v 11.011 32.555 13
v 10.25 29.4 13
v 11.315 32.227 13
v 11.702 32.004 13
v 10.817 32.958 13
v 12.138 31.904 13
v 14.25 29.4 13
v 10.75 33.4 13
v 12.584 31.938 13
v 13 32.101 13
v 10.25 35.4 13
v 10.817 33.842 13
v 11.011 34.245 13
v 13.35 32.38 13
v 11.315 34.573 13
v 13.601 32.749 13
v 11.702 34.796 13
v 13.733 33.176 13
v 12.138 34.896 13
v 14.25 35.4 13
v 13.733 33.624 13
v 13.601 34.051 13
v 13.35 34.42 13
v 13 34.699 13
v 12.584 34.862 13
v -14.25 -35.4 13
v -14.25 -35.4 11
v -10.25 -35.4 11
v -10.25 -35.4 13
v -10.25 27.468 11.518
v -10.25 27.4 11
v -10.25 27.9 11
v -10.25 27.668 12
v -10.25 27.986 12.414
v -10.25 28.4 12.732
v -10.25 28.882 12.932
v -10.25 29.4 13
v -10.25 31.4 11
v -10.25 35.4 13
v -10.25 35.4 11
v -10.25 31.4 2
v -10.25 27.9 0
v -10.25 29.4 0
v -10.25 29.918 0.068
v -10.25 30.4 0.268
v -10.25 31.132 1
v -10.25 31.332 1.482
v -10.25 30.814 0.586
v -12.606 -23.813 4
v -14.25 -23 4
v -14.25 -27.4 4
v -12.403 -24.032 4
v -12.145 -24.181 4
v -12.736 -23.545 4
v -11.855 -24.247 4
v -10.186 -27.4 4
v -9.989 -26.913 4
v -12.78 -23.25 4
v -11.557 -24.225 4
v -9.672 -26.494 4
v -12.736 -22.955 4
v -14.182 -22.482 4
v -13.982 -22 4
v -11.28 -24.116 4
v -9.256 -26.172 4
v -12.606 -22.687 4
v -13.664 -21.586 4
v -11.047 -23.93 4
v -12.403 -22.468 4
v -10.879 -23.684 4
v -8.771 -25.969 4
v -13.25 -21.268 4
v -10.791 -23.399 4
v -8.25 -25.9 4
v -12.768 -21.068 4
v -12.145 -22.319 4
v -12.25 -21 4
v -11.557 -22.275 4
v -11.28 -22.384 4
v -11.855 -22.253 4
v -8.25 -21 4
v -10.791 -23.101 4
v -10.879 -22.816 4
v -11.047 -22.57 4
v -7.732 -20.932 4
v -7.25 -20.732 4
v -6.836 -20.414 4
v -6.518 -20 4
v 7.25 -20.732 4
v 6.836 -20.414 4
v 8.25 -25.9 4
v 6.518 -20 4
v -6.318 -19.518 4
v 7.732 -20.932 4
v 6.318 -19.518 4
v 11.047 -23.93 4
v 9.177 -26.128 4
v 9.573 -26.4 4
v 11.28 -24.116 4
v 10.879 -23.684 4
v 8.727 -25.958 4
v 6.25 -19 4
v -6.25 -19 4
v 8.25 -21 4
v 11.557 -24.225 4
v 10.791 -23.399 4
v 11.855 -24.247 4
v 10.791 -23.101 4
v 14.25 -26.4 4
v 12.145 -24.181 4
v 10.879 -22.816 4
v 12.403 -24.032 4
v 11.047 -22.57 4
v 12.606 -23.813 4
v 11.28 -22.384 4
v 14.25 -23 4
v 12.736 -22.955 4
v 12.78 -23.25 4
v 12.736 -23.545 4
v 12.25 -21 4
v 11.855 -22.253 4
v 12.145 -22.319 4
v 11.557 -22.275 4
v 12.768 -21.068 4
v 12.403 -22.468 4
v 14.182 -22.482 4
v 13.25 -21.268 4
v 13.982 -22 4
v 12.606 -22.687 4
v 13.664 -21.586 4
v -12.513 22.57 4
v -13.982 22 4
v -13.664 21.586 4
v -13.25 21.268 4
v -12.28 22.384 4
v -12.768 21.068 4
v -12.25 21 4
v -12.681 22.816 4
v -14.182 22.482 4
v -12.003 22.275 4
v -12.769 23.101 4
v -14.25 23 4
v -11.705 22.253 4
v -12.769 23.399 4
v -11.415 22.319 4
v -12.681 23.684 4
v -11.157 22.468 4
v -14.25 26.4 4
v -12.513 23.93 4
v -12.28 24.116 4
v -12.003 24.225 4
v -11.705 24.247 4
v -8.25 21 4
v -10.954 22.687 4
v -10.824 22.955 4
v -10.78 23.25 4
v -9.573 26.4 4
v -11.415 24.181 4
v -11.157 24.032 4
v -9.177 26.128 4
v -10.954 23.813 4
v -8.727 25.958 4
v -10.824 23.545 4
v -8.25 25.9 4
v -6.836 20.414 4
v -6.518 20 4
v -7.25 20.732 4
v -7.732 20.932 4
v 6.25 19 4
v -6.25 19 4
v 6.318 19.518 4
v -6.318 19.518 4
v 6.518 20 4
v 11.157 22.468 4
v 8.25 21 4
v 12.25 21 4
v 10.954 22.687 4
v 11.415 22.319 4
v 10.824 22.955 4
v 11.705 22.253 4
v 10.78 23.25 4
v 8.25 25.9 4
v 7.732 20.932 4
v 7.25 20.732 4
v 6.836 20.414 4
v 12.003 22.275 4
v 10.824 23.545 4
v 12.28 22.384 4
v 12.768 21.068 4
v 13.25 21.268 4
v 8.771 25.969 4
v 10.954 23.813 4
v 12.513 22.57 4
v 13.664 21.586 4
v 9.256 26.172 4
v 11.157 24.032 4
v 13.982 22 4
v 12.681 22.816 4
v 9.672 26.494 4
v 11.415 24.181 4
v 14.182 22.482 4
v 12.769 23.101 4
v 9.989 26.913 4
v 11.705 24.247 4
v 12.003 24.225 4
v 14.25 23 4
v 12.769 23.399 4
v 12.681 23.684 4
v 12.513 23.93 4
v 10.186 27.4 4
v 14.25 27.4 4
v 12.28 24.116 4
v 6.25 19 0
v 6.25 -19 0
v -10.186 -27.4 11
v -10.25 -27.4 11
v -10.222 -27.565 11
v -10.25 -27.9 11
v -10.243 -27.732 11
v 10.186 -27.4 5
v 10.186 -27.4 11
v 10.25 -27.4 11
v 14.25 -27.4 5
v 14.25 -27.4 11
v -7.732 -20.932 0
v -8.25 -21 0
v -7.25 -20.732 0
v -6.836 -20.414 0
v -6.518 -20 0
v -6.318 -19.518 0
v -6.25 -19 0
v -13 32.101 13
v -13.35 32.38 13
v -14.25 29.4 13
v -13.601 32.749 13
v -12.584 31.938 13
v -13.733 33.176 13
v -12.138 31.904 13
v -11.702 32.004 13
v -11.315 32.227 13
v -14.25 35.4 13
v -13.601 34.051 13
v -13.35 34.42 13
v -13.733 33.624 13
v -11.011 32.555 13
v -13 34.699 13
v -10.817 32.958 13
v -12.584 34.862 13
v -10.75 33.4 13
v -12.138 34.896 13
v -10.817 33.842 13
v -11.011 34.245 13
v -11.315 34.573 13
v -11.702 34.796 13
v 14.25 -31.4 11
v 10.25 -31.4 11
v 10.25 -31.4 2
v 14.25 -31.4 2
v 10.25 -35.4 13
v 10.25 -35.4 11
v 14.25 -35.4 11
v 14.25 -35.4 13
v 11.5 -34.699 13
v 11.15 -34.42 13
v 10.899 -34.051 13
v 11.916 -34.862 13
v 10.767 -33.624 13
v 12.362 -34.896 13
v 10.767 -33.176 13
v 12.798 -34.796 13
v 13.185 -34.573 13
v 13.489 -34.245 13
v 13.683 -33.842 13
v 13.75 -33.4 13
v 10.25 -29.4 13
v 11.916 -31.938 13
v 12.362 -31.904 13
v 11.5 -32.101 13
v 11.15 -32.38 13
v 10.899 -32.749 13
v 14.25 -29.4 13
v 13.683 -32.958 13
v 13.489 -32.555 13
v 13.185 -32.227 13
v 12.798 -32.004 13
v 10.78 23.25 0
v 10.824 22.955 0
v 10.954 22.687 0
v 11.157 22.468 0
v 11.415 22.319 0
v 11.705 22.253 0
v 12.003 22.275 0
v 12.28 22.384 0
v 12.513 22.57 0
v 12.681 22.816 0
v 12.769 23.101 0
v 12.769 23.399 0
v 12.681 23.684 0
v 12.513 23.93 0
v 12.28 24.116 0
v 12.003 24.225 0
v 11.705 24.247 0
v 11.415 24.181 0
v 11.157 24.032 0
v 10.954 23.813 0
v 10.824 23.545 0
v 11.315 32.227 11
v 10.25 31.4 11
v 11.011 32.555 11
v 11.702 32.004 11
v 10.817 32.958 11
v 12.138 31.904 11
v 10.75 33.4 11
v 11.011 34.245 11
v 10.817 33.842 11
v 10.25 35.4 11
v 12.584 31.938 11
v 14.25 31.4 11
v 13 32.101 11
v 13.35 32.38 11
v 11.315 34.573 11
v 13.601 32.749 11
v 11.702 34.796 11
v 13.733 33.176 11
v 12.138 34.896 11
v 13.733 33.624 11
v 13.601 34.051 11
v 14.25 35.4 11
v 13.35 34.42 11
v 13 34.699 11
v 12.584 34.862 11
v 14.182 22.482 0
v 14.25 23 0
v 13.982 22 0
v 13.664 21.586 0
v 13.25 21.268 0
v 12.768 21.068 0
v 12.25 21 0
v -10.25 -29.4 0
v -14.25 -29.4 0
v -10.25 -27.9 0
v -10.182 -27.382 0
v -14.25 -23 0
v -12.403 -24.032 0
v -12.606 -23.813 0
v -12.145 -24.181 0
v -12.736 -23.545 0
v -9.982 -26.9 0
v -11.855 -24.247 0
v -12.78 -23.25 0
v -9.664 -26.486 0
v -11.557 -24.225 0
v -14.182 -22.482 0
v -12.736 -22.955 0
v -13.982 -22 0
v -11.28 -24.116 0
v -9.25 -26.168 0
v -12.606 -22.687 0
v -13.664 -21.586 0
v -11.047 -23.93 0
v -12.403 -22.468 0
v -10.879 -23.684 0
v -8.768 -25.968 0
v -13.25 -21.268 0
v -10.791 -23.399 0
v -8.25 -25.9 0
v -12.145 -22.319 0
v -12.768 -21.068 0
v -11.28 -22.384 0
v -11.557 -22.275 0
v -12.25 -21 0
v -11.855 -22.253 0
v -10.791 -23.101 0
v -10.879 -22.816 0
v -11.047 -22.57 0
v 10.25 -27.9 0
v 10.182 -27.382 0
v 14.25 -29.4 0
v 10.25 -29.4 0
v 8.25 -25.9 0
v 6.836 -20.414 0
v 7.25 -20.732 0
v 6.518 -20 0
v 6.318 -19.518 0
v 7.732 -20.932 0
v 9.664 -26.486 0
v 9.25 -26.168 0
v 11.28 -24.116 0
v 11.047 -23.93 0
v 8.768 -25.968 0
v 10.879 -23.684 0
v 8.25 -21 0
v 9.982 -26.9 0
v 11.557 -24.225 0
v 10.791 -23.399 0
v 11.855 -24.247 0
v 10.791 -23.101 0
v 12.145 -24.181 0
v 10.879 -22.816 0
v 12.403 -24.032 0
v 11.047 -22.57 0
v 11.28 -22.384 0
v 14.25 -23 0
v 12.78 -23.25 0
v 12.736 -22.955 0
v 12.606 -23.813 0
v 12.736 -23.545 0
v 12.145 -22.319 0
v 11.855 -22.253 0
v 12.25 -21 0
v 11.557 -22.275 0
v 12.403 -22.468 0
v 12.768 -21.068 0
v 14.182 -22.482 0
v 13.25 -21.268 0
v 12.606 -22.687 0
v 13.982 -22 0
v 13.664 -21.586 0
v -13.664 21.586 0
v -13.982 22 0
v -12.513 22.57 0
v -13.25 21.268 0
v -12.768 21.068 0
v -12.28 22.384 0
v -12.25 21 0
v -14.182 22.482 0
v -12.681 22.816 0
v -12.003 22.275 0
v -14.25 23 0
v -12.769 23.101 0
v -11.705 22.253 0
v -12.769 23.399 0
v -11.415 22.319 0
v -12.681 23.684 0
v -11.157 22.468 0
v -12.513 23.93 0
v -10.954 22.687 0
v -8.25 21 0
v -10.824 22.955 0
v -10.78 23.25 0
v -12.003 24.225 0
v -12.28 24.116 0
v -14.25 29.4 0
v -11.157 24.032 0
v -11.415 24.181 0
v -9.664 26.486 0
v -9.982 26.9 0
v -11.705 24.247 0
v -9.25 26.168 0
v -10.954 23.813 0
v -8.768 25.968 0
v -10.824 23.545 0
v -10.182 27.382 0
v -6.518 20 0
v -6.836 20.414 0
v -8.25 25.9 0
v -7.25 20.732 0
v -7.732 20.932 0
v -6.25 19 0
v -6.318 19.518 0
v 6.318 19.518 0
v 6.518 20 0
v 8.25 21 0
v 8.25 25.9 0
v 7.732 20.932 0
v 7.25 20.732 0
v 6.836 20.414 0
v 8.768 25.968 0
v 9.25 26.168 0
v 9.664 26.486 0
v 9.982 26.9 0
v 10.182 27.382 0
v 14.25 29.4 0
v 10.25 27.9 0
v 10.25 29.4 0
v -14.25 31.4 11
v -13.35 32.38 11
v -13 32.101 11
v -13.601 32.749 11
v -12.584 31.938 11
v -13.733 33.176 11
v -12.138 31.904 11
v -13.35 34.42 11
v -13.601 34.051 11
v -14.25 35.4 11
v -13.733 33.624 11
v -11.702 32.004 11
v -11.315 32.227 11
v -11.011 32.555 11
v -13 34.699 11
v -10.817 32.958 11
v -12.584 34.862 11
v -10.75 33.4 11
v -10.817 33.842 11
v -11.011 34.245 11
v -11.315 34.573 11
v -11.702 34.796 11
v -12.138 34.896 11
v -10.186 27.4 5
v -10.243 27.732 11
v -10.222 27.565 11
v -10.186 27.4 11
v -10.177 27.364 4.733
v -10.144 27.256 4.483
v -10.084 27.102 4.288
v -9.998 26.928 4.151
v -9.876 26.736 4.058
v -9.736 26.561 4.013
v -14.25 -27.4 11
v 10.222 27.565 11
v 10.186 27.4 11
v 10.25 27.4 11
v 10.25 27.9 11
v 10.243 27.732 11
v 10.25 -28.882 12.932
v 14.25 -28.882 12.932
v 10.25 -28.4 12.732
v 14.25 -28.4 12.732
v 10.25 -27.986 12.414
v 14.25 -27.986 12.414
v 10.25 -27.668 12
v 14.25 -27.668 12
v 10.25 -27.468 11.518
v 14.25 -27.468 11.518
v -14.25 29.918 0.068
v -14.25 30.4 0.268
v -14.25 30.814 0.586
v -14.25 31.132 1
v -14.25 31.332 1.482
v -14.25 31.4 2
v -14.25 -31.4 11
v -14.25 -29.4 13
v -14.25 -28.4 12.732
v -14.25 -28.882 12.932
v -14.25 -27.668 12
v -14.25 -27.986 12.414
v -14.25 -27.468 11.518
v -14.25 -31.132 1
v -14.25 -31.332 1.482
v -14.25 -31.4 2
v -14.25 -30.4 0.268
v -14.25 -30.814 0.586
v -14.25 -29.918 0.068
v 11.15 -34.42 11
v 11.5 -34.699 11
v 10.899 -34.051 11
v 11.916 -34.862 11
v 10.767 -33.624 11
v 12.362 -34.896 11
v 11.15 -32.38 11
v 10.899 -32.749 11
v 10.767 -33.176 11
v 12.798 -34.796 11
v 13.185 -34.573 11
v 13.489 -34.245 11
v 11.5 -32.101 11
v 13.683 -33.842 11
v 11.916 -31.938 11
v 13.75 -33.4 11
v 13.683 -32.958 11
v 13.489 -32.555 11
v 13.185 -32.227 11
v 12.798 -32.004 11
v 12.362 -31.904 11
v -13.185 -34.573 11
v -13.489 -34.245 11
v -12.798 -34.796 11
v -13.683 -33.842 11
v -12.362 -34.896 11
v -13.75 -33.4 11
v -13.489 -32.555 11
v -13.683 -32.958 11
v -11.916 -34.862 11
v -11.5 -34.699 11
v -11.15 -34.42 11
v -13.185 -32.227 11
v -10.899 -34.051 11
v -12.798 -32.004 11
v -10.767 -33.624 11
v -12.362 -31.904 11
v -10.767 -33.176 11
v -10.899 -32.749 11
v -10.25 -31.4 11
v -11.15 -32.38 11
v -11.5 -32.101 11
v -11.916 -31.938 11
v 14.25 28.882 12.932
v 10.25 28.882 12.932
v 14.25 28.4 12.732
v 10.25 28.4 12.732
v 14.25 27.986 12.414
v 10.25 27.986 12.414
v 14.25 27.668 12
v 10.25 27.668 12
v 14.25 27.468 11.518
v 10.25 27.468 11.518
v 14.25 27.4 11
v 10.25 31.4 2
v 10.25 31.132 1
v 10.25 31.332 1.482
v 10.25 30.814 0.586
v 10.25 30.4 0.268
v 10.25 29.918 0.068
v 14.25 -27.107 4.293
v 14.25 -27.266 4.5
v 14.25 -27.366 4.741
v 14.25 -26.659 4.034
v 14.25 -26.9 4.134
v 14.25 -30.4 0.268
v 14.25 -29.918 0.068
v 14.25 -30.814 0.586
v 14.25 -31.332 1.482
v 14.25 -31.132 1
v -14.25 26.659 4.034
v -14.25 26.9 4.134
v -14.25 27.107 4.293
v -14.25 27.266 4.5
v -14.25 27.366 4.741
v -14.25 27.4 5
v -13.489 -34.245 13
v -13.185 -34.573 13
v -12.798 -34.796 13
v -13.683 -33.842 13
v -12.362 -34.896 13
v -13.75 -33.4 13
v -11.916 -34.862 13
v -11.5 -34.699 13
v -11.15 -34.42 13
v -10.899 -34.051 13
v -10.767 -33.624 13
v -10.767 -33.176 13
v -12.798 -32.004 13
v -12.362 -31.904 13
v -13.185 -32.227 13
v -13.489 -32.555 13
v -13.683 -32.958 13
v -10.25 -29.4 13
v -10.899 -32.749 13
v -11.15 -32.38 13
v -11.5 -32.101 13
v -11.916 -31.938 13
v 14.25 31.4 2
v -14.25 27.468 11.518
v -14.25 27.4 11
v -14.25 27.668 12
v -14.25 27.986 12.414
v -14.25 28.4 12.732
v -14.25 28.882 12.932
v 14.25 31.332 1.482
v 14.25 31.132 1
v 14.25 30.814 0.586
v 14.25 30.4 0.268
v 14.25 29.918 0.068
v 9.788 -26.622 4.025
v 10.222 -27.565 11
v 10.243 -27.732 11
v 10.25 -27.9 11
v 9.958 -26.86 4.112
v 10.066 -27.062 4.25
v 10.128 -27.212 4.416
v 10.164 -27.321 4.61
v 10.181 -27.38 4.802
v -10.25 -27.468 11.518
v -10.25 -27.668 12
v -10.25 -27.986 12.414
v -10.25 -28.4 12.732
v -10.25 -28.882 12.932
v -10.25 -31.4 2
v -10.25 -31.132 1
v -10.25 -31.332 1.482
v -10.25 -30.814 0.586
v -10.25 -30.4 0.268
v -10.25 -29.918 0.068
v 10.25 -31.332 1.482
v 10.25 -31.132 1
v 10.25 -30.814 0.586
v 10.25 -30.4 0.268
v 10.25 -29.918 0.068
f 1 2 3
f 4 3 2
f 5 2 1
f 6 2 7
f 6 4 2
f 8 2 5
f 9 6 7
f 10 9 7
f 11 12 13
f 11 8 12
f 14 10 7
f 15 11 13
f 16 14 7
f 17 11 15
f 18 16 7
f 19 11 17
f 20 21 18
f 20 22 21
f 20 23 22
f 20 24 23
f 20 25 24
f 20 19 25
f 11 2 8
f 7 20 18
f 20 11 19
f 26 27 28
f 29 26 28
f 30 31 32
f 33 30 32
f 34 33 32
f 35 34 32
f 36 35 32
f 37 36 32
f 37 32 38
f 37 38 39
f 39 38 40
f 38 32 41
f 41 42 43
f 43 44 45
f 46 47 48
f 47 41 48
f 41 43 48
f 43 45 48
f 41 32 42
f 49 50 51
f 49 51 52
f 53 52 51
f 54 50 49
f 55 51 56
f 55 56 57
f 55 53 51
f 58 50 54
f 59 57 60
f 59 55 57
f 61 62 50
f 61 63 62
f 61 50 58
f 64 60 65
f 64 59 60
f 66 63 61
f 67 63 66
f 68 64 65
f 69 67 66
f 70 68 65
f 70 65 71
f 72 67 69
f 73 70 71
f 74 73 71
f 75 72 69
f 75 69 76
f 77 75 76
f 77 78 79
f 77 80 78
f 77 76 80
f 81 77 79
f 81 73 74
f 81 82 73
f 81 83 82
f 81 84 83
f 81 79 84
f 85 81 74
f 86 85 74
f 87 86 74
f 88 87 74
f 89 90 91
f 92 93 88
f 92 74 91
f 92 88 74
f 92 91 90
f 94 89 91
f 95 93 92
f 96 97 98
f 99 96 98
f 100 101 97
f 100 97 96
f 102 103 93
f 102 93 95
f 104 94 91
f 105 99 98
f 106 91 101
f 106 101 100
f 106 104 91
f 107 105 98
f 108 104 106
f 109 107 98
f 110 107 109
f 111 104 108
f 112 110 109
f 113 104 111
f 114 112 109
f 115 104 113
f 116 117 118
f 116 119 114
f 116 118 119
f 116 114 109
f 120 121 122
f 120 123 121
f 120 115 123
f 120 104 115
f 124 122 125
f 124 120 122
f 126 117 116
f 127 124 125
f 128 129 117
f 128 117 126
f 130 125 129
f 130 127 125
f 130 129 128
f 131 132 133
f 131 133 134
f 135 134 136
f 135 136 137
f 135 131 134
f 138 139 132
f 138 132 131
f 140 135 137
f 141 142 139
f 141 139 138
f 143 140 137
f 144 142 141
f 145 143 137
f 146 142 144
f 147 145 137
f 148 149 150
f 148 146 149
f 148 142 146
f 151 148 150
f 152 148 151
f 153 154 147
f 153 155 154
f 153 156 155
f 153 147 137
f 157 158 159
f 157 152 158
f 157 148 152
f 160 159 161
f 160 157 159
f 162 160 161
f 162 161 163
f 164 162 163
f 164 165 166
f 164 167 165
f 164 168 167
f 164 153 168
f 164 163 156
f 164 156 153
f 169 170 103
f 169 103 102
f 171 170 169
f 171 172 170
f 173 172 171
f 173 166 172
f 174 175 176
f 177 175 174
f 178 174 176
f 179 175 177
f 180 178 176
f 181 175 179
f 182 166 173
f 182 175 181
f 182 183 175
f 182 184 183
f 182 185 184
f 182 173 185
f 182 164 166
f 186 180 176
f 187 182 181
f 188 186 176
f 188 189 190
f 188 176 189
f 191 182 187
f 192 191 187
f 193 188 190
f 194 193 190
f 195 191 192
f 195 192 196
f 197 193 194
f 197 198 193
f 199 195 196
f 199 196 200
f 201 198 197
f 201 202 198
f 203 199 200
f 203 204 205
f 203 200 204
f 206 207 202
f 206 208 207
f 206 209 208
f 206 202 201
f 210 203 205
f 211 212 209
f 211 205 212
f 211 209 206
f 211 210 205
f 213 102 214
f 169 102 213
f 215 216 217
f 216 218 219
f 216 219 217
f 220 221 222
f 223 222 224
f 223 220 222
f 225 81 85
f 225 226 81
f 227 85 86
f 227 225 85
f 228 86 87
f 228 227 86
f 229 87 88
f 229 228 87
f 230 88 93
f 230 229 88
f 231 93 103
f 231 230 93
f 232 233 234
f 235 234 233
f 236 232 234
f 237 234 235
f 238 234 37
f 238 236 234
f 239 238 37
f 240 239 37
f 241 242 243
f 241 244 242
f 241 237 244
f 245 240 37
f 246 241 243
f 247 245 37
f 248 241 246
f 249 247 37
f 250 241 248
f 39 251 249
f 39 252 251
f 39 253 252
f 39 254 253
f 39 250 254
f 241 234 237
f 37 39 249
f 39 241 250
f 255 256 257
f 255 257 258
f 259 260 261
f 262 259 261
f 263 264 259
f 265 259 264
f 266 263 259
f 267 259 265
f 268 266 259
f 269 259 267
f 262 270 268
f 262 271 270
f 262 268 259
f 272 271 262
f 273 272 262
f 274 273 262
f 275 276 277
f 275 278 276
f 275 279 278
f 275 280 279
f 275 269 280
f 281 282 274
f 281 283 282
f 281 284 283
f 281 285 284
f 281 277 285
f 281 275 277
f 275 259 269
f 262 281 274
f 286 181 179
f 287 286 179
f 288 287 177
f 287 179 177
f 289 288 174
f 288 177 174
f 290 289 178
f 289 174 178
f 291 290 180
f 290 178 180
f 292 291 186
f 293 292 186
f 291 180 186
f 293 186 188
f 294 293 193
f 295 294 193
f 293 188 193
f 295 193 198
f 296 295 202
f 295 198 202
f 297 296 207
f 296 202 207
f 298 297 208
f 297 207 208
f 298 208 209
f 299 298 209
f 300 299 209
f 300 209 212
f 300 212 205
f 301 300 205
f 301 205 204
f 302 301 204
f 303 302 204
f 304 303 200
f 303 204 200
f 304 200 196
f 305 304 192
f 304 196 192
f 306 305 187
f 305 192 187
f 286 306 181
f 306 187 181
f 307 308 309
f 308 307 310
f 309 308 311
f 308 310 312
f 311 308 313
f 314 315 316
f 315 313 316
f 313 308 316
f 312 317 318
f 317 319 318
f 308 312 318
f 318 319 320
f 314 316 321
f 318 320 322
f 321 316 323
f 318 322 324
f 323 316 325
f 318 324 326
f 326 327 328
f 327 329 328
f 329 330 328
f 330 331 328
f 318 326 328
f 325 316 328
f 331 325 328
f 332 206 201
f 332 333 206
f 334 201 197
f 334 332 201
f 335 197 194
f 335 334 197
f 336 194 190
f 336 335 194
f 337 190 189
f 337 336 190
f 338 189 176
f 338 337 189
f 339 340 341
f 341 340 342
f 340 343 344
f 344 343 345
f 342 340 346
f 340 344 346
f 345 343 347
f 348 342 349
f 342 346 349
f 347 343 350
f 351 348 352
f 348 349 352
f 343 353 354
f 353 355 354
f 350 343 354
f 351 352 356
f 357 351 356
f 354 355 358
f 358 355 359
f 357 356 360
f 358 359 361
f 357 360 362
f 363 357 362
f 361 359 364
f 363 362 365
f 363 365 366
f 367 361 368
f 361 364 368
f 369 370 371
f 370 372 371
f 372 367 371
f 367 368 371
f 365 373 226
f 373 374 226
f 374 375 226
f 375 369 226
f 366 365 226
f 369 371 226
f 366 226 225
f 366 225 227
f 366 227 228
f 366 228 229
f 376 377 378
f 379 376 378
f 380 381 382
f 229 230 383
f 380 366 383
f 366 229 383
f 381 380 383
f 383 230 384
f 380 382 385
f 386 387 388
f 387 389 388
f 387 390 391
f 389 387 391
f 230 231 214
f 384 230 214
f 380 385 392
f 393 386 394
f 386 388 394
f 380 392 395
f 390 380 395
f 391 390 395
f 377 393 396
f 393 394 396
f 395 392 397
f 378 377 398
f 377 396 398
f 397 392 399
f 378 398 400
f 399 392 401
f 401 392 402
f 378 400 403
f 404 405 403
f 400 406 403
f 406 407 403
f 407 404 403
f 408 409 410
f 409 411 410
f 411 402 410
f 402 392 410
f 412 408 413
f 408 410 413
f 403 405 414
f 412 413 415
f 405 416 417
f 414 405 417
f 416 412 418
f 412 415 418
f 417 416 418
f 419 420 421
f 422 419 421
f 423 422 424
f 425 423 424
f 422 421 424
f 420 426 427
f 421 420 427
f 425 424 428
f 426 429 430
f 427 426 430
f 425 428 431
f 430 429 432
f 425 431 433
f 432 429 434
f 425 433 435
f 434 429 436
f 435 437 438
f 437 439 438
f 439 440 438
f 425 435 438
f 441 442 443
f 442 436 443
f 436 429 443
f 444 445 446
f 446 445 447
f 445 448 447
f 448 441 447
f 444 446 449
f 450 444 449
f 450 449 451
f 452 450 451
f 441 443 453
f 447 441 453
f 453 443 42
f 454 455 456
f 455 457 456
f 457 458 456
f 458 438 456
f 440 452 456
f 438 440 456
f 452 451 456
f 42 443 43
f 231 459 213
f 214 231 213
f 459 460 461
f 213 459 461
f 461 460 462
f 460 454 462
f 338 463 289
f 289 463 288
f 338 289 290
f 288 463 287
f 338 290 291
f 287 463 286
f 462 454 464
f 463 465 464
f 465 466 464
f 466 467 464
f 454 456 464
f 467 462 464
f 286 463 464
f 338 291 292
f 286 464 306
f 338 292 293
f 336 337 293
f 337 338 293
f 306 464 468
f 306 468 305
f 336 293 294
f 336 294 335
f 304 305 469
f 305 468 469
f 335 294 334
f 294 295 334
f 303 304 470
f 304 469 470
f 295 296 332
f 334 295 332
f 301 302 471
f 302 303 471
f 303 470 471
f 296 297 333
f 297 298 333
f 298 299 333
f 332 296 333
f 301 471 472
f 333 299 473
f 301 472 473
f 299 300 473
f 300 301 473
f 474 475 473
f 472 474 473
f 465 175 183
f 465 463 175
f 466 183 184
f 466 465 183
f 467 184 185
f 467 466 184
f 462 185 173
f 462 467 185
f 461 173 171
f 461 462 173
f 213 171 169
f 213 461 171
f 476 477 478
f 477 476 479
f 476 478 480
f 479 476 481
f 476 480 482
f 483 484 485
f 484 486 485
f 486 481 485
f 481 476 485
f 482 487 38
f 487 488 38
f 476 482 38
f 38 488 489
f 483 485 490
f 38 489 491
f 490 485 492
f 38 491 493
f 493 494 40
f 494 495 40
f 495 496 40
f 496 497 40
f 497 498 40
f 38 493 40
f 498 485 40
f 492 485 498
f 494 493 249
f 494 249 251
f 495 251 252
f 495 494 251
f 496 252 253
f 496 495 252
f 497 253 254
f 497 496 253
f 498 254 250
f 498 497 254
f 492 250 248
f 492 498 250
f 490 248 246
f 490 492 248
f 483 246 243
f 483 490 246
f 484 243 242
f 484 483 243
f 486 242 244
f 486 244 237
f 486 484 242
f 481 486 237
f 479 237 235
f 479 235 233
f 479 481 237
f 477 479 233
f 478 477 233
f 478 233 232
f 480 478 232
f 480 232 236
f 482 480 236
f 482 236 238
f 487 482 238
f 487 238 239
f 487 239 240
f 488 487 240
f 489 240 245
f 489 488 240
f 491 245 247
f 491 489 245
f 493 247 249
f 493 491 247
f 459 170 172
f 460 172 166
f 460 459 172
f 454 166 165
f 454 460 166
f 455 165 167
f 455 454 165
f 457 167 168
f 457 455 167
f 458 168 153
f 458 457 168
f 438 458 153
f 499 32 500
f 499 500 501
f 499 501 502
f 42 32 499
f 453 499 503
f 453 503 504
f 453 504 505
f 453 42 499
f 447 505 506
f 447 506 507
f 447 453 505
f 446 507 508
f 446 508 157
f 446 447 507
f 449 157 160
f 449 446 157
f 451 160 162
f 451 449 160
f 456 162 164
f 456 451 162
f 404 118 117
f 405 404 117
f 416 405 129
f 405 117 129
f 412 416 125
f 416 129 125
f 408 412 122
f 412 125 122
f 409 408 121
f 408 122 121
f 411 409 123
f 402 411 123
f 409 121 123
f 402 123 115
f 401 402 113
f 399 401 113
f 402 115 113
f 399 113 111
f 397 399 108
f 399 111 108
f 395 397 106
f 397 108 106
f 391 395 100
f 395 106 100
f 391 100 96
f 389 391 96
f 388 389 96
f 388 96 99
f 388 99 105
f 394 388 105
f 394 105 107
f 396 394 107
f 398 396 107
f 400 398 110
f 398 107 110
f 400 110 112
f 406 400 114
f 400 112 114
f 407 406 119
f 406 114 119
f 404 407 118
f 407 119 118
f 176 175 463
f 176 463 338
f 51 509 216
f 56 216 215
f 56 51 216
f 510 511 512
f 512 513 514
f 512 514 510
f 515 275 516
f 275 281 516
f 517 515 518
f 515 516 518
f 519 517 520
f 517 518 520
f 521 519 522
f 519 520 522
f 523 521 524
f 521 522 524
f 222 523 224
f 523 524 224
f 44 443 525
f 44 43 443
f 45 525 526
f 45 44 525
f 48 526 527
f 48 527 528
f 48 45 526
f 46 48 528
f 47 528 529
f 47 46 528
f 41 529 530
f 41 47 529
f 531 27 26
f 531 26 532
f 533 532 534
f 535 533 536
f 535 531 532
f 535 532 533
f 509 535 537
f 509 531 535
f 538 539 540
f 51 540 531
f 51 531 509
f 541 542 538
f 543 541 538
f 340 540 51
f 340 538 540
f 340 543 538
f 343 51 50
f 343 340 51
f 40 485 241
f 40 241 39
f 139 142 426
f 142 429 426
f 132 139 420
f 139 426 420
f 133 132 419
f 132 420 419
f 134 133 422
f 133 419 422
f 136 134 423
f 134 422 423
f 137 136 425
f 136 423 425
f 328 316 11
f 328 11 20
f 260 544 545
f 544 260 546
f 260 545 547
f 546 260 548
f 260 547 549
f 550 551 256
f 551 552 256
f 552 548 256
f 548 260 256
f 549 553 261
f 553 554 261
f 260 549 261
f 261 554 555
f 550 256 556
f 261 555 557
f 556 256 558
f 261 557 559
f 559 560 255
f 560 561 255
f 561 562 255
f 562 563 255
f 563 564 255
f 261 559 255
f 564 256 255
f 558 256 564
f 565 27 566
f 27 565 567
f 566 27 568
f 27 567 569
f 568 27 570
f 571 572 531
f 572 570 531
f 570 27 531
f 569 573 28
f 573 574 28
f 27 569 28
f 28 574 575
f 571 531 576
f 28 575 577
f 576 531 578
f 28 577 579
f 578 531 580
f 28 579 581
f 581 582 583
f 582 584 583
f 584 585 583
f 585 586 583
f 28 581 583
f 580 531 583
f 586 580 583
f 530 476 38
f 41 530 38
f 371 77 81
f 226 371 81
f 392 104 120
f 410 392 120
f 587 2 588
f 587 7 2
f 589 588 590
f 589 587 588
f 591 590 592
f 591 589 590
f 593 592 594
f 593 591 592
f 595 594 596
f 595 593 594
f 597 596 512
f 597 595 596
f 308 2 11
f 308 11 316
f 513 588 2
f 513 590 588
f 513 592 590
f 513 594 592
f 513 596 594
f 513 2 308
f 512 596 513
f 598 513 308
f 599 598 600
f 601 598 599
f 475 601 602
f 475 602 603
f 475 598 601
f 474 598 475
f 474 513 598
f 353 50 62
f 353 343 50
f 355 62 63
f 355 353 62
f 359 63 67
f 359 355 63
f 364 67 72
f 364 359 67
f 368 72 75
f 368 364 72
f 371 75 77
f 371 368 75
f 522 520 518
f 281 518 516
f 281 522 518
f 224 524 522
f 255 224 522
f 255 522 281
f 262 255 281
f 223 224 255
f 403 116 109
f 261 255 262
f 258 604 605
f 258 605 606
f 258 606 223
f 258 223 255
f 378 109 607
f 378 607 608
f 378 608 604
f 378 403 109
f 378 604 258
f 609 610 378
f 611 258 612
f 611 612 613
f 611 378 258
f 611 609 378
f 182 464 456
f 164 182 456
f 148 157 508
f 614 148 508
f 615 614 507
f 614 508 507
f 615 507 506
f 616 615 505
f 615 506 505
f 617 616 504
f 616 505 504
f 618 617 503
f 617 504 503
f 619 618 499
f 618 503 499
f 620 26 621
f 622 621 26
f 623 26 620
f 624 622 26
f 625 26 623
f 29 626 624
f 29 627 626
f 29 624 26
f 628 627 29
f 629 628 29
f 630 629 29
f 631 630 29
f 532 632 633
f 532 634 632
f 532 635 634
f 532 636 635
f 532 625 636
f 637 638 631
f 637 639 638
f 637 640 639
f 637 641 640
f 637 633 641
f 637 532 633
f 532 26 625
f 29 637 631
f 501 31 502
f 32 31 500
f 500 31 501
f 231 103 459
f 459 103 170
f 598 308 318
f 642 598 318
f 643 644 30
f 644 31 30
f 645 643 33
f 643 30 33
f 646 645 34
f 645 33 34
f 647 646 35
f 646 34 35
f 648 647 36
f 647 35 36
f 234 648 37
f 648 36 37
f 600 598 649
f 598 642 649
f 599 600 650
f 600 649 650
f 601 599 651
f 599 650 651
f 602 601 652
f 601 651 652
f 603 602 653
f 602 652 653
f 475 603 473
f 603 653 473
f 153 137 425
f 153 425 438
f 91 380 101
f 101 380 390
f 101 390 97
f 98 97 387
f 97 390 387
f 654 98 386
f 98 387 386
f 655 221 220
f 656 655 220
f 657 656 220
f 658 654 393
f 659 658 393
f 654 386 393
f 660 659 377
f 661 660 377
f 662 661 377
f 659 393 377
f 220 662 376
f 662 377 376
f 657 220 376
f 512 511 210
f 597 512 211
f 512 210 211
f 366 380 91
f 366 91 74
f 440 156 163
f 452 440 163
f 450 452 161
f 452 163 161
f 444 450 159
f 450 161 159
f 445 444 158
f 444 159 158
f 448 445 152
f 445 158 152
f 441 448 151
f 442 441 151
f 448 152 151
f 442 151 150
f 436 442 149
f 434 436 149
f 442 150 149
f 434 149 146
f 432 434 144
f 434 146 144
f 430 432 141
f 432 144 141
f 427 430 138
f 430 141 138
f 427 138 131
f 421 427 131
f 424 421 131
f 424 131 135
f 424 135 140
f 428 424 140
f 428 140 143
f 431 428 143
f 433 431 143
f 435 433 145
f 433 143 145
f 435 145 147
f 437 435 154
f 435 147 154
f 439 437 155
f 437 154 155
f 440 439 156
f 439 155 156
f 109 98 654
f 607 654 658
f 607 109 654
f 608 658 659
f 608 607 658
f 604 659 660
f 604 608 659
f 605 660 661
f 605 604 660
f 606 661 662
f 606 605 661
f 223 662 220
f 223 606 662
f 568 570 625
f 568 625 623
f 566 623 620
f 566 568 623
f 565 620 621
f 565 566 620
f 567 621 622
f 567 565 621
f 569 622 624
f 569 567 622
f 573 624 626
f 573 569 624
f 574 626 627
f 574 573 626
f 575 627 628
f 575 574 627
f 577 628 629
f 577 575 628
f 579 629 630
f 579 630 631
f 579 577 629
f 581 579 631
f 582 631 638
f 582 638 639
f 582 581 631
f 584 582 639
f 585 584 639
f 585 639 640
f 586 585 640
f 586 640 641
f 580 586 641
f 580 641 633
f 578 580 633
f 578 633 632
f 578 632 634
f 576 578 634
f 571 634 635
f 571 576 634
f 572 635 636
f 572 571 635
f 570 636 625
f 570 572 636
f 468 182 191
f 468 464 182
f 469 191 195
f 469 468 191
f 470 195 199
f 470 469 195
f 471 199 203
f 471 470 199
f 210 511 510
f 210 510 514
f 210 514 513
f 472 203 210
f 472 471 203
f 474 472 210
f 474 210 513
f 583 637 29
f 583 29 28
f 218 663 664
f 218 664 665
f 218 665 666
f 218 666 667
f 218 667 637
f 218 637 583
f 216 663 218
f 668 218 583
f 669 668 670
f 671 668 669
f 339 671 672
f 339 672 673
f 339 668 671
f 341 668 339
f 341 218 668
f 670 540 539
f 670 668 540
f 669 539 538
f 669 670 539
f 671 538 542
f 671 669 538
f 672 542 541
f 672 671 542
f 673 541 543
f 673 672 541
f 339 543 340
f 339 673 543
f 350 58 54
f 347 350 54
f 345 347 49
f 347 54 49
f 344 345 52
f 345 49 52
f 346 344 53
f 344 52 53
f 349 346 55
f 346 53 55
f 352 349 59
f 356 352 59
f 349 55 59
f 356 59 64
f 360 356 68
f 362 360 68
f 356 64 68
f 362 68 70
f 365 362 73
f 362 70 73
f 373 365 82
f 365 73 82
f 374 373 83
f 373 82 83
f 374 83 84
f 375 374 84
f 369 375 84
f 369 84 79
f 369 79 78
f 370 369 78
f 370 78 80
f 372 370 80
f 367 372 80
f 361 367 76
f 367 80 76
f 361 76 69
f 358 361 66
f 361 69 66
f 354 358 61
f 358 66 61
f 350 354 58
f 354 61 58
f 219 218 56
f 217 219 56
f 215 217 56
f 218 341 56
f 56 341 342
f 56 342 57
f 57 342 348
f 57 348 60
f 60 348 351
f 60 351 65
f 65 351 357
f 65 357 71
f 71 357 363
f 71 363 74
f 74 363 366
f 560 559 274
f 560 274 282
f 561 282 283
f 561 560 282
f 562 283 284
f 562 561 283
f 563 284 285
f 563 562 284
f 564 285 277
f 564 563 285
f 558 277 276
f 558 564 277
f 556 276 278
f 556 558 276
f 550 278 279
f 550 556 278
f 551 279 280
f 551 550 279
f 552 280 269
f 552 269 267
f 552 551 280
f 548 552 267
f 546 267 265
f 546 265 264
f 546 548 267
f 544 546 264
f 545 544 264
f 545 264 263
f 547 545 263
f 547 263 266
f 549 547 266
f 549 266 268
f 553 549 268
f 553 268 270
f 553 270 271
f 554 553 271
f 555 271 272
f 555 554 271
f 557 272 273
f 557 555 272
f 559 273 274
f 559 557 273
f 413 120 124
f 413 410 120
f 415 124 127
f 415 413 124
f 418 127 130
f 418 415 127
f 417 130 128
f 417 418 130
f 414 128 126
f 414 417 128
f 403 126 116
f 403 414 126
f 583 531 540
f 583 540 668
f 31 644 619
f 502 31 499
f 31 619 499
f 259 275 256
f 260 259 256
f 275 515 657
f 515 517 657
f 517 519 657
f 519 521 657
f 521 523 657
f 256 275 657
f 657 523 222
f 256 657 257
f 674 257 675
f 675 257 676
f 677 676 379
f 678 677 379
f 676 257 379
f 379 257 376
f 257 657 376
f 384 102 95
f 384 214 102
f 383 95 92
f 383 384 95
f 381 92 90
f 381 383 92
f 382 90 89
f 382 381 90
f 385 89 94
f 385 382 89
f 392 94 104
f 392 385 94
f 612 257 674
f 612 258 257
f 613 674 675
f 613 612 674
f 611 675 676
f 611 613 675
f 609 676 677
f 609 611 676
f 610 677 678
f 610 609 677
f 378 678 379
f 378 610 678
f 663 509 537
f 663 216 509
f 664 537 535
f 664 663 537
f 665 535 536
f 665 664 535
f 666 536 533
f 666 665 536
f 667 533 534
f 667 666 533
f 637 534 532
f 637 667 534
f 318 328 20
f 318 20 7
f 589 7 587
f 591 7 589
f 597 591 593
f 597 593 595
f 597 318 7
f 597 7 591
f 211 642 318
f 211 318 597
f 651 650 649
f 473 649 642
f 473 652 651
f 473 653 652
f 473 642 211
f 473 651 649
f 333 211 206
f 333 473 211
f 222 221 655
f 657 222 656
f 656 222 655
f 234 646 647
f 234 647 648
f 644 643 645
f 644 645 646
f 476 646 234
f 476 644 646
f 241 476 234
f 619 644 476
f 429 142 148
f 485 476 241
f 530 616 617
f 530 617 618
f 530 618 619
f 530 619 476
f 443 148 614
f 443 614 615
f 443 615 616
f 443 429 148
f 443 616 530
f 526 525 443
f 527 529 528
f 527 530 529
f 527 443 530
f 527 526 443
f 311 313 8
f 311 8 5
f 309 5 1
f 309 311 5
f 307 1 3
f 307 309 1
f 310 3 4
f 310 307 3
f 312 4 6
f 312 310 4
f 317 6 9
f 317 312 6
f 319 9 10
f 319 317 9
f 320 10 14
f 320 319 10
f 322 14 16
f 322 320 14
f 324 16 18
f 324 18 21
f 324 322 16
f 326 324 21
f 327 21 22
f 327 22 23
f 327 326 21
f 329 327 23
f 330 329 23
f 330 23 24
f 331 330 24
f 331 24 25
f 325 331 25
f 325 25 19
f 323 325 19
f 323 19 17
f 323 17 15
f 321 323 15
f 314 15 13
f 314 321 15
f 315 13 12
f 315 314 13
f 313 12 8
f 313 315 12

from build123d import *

# Parameters (mm, degrees)
SKETCH3_W           = 28.5
SKETCH3_H           = 51.8
BOSS_EXTRUDE4_DEPTH = 4
SKETCH7_W           = 4
SKETCH7_H           = 4
BOSS_EXTRUDE5_DEPTH = 5.5
SKETCH8_W           = 4
SKETCH8_H           = 4
BOSS_EXTRUDE6_DEPTH = 7
SKETCH10_R          = 1
CUT_EXTRUDE2_DEPTH  = 4
SKETCH11_W          = 8
SKETCH11_H          = 42
CUT_EXTRUDE3_DEPTH  = 36.185543907
FILLET2_R           = 1
FILLET3_R           = 2
SKETCH9_W           = 4
SKETCH9_H           = 8
SKETCH9_R           = 1.5
BOSS_EXTRUDE8_DEPTH = 2
FILLET4_R           = 2


with BuildPart() as part:
    # Sketch3 → Boss-Extrude4 (new body)
    with BuildSketch(Plane(origin=(0, 0, 0), x_dir=(-1, 0, 0), z_dir=(0, 0, 1))):
        Rectangle(SKETCH3_W, SKETCH3_H)
    extrude(amount=BOSS_EXTRUDE4_DEPTH)

    # Sketch7 → Boss-Extrude5 (add)
    with BuildSketch(Plane(origin=(0, 25.9, 0), x_dir=(1, 0, 0), z_dir=(0, 1, 0))):
        with Locations((-12.25, -2)):
            Rectangle(SKETCH7_W, SKETCH7_H)
        with Locations((12.25, -2)):
            Rectangle(SKETCH7_W, SKETCH7_H)
    boss_extrude5 = extrude(amount=BOSS_EXTRUDE5_DEPTH)

    # Mirror1: Boss-Extrude5 across plane
    add(boss_extrude5.mirror(Plane.ZX))

    # Sketch8 → Boss-Extrude6 (add)
    with BuildSketch(Plane.XY.offset(4)):
        with Locations((-12.25, 29.4)):
            Rectangle(SKETCH8_W, SKETCH8_H)
        with Locations((12.25, 29.4)):
            Rectangle(SKETCH8_W, SKETCH8_H)
        with Locations((12.25, -29.4)):
            Rectangle(SKETCH8_W, SKETCH8_H)
        with Locations((-12.25, -29.4)):
            Rectangle(SKETCH8_W, SKETCH8_H)
    extrude(amount=BOSS_EXTRUDE6_DEPTH)

    # Sketch10 → Cut-Extrude2 (cut)
    with BuildSketch(Plane.XY.offset(4)):
        with Locations((-11.78, 23.25)):
            Circle(SKETCH10_R)
        with Locations(Location((-11.78, -23.25, 0), (0, 0, 180))):
            Circle(SKETCH10_R)
        with Locations((11.78, -23.25)):
            Circle(SKETCH10_R)
        with Locations(Location((11.78, 23.25, 0), (0, 0, 180))):
            Circle(SKETCH10_R)
    extrude(amount=-CUT_EXTRUDE2_DEPTH, mode=Mode.SUBTRACT)

    # Sketch11 → Cut-Extrude3 (cut, through all)
    with BuildSketch(Plane.XY.offset(4)):
        with Locations((-10.25, 0)):
            Rectangle(SKETCH11_W, SKETCH11_H)
        with Locations((10.25, 0)):
            Rectangle(SKETCH11_W, SKETCH11_H)
    extrude(amount=-CUT_EXTRUDE3_DEPTH, mode=Mode.SUBTRACT)

    # Fillet2
    fillet2_edges = [part.edges().sort_by_distance(p)[0] for p in [
        (12.25, -27.4, 4),
        (-12.25, 27.4, 4),
    ]]
    fillet(fillet2_edges, radius=FILLET2_R)

    # Fillet3
    fillet3_edges = [part.edges().sort_by_distance(p)[0] for p in [
        (-10.25, -25.9, 2),
        (10.25, -25.9, 2),
        (-10.25, 25.9, 2),
        (10.25, 25.9, 2),
    ]]
    fillet(fillet3_edges, radius=FILLET3_R)

    # Sketch9 → Boss-Extrude8 (add)
    # profile 1 of 4: a face of its own
    with BuildSketch(Plane.XY.offset(11)):
        with Locations((-12.25, 31.4)):
            Rectangle(SKETCH9_W, SKETCH9_H)
        with Locations((-12.25, 33.4)):
            Circle(SKETCH9_R, mode=Mode.SUBTRACT)
    # profile 2 of 4: a face of its own
    with BuildSketch(Plane.XY.offset(11)):
        with Locations((12.25, 31.4)):
            Rectangle(SKETCH9_W, SKETCH9_H)
        with Locations(Location((12.25, 33.4, 0), (0, 0, 180))):
            Circle(SKETCH9_R, mode=Mode.SUBTRACT)
    # profile 3 of 4: a face of its own
    with BuildSketch(Plane.XY.offset(11)):
        with Locations((12.25, -31.4)):
            Rectangle(SKETCH9_W, SKETCH9_H)
        with Locations((12.25, -33.4)):
            Circle(SKETCH9_R, mode=Mode.SUBTRACT)
    # profile 4 of 4: a face of its own
    with BuildSketch(Plane.XY.offset(11)):
        with Locations((-12.25, -31.4)):
            Rectangle(SKETCH9_W, SKETCH9_H)
        with Locations(Location((-12.25, -33.4, 0), (0, 0, 180))):
            Circle(SKETCH9_R, mode=Mode.SUBTRACT)
    extrude(amount=BOSS_EXTRUDE8_DEPTH)

    # Fillet4
    fillet4_edges = [part.edges().sort_by_distance(p)[0] for p in [
        (-14.25, -21, 2),
        (-14.25, 21, 2),
        (-6.25, 21, 2),
        (-6.25, -21, 2),
        (6.25, 21, 2),
        (14.25, 21, 2),
        (14.25, -21, 2),
        (6.25, -21, 2),
        (-12.25, 31.4, 0),
        (-12.25, -27.4, 13),
        (12.25, 31.4, 0),
        (12.25, -27.4, 13),
        (12.25, 27.4, 13),
        (-12.25, 27.4, 13),
        (-12.25, -31.4, 0),
        (12.25, -31.4, 0),
    ]]
    fillet(fillet4_edges, radius=FILLET4_R)


solid = part.part
